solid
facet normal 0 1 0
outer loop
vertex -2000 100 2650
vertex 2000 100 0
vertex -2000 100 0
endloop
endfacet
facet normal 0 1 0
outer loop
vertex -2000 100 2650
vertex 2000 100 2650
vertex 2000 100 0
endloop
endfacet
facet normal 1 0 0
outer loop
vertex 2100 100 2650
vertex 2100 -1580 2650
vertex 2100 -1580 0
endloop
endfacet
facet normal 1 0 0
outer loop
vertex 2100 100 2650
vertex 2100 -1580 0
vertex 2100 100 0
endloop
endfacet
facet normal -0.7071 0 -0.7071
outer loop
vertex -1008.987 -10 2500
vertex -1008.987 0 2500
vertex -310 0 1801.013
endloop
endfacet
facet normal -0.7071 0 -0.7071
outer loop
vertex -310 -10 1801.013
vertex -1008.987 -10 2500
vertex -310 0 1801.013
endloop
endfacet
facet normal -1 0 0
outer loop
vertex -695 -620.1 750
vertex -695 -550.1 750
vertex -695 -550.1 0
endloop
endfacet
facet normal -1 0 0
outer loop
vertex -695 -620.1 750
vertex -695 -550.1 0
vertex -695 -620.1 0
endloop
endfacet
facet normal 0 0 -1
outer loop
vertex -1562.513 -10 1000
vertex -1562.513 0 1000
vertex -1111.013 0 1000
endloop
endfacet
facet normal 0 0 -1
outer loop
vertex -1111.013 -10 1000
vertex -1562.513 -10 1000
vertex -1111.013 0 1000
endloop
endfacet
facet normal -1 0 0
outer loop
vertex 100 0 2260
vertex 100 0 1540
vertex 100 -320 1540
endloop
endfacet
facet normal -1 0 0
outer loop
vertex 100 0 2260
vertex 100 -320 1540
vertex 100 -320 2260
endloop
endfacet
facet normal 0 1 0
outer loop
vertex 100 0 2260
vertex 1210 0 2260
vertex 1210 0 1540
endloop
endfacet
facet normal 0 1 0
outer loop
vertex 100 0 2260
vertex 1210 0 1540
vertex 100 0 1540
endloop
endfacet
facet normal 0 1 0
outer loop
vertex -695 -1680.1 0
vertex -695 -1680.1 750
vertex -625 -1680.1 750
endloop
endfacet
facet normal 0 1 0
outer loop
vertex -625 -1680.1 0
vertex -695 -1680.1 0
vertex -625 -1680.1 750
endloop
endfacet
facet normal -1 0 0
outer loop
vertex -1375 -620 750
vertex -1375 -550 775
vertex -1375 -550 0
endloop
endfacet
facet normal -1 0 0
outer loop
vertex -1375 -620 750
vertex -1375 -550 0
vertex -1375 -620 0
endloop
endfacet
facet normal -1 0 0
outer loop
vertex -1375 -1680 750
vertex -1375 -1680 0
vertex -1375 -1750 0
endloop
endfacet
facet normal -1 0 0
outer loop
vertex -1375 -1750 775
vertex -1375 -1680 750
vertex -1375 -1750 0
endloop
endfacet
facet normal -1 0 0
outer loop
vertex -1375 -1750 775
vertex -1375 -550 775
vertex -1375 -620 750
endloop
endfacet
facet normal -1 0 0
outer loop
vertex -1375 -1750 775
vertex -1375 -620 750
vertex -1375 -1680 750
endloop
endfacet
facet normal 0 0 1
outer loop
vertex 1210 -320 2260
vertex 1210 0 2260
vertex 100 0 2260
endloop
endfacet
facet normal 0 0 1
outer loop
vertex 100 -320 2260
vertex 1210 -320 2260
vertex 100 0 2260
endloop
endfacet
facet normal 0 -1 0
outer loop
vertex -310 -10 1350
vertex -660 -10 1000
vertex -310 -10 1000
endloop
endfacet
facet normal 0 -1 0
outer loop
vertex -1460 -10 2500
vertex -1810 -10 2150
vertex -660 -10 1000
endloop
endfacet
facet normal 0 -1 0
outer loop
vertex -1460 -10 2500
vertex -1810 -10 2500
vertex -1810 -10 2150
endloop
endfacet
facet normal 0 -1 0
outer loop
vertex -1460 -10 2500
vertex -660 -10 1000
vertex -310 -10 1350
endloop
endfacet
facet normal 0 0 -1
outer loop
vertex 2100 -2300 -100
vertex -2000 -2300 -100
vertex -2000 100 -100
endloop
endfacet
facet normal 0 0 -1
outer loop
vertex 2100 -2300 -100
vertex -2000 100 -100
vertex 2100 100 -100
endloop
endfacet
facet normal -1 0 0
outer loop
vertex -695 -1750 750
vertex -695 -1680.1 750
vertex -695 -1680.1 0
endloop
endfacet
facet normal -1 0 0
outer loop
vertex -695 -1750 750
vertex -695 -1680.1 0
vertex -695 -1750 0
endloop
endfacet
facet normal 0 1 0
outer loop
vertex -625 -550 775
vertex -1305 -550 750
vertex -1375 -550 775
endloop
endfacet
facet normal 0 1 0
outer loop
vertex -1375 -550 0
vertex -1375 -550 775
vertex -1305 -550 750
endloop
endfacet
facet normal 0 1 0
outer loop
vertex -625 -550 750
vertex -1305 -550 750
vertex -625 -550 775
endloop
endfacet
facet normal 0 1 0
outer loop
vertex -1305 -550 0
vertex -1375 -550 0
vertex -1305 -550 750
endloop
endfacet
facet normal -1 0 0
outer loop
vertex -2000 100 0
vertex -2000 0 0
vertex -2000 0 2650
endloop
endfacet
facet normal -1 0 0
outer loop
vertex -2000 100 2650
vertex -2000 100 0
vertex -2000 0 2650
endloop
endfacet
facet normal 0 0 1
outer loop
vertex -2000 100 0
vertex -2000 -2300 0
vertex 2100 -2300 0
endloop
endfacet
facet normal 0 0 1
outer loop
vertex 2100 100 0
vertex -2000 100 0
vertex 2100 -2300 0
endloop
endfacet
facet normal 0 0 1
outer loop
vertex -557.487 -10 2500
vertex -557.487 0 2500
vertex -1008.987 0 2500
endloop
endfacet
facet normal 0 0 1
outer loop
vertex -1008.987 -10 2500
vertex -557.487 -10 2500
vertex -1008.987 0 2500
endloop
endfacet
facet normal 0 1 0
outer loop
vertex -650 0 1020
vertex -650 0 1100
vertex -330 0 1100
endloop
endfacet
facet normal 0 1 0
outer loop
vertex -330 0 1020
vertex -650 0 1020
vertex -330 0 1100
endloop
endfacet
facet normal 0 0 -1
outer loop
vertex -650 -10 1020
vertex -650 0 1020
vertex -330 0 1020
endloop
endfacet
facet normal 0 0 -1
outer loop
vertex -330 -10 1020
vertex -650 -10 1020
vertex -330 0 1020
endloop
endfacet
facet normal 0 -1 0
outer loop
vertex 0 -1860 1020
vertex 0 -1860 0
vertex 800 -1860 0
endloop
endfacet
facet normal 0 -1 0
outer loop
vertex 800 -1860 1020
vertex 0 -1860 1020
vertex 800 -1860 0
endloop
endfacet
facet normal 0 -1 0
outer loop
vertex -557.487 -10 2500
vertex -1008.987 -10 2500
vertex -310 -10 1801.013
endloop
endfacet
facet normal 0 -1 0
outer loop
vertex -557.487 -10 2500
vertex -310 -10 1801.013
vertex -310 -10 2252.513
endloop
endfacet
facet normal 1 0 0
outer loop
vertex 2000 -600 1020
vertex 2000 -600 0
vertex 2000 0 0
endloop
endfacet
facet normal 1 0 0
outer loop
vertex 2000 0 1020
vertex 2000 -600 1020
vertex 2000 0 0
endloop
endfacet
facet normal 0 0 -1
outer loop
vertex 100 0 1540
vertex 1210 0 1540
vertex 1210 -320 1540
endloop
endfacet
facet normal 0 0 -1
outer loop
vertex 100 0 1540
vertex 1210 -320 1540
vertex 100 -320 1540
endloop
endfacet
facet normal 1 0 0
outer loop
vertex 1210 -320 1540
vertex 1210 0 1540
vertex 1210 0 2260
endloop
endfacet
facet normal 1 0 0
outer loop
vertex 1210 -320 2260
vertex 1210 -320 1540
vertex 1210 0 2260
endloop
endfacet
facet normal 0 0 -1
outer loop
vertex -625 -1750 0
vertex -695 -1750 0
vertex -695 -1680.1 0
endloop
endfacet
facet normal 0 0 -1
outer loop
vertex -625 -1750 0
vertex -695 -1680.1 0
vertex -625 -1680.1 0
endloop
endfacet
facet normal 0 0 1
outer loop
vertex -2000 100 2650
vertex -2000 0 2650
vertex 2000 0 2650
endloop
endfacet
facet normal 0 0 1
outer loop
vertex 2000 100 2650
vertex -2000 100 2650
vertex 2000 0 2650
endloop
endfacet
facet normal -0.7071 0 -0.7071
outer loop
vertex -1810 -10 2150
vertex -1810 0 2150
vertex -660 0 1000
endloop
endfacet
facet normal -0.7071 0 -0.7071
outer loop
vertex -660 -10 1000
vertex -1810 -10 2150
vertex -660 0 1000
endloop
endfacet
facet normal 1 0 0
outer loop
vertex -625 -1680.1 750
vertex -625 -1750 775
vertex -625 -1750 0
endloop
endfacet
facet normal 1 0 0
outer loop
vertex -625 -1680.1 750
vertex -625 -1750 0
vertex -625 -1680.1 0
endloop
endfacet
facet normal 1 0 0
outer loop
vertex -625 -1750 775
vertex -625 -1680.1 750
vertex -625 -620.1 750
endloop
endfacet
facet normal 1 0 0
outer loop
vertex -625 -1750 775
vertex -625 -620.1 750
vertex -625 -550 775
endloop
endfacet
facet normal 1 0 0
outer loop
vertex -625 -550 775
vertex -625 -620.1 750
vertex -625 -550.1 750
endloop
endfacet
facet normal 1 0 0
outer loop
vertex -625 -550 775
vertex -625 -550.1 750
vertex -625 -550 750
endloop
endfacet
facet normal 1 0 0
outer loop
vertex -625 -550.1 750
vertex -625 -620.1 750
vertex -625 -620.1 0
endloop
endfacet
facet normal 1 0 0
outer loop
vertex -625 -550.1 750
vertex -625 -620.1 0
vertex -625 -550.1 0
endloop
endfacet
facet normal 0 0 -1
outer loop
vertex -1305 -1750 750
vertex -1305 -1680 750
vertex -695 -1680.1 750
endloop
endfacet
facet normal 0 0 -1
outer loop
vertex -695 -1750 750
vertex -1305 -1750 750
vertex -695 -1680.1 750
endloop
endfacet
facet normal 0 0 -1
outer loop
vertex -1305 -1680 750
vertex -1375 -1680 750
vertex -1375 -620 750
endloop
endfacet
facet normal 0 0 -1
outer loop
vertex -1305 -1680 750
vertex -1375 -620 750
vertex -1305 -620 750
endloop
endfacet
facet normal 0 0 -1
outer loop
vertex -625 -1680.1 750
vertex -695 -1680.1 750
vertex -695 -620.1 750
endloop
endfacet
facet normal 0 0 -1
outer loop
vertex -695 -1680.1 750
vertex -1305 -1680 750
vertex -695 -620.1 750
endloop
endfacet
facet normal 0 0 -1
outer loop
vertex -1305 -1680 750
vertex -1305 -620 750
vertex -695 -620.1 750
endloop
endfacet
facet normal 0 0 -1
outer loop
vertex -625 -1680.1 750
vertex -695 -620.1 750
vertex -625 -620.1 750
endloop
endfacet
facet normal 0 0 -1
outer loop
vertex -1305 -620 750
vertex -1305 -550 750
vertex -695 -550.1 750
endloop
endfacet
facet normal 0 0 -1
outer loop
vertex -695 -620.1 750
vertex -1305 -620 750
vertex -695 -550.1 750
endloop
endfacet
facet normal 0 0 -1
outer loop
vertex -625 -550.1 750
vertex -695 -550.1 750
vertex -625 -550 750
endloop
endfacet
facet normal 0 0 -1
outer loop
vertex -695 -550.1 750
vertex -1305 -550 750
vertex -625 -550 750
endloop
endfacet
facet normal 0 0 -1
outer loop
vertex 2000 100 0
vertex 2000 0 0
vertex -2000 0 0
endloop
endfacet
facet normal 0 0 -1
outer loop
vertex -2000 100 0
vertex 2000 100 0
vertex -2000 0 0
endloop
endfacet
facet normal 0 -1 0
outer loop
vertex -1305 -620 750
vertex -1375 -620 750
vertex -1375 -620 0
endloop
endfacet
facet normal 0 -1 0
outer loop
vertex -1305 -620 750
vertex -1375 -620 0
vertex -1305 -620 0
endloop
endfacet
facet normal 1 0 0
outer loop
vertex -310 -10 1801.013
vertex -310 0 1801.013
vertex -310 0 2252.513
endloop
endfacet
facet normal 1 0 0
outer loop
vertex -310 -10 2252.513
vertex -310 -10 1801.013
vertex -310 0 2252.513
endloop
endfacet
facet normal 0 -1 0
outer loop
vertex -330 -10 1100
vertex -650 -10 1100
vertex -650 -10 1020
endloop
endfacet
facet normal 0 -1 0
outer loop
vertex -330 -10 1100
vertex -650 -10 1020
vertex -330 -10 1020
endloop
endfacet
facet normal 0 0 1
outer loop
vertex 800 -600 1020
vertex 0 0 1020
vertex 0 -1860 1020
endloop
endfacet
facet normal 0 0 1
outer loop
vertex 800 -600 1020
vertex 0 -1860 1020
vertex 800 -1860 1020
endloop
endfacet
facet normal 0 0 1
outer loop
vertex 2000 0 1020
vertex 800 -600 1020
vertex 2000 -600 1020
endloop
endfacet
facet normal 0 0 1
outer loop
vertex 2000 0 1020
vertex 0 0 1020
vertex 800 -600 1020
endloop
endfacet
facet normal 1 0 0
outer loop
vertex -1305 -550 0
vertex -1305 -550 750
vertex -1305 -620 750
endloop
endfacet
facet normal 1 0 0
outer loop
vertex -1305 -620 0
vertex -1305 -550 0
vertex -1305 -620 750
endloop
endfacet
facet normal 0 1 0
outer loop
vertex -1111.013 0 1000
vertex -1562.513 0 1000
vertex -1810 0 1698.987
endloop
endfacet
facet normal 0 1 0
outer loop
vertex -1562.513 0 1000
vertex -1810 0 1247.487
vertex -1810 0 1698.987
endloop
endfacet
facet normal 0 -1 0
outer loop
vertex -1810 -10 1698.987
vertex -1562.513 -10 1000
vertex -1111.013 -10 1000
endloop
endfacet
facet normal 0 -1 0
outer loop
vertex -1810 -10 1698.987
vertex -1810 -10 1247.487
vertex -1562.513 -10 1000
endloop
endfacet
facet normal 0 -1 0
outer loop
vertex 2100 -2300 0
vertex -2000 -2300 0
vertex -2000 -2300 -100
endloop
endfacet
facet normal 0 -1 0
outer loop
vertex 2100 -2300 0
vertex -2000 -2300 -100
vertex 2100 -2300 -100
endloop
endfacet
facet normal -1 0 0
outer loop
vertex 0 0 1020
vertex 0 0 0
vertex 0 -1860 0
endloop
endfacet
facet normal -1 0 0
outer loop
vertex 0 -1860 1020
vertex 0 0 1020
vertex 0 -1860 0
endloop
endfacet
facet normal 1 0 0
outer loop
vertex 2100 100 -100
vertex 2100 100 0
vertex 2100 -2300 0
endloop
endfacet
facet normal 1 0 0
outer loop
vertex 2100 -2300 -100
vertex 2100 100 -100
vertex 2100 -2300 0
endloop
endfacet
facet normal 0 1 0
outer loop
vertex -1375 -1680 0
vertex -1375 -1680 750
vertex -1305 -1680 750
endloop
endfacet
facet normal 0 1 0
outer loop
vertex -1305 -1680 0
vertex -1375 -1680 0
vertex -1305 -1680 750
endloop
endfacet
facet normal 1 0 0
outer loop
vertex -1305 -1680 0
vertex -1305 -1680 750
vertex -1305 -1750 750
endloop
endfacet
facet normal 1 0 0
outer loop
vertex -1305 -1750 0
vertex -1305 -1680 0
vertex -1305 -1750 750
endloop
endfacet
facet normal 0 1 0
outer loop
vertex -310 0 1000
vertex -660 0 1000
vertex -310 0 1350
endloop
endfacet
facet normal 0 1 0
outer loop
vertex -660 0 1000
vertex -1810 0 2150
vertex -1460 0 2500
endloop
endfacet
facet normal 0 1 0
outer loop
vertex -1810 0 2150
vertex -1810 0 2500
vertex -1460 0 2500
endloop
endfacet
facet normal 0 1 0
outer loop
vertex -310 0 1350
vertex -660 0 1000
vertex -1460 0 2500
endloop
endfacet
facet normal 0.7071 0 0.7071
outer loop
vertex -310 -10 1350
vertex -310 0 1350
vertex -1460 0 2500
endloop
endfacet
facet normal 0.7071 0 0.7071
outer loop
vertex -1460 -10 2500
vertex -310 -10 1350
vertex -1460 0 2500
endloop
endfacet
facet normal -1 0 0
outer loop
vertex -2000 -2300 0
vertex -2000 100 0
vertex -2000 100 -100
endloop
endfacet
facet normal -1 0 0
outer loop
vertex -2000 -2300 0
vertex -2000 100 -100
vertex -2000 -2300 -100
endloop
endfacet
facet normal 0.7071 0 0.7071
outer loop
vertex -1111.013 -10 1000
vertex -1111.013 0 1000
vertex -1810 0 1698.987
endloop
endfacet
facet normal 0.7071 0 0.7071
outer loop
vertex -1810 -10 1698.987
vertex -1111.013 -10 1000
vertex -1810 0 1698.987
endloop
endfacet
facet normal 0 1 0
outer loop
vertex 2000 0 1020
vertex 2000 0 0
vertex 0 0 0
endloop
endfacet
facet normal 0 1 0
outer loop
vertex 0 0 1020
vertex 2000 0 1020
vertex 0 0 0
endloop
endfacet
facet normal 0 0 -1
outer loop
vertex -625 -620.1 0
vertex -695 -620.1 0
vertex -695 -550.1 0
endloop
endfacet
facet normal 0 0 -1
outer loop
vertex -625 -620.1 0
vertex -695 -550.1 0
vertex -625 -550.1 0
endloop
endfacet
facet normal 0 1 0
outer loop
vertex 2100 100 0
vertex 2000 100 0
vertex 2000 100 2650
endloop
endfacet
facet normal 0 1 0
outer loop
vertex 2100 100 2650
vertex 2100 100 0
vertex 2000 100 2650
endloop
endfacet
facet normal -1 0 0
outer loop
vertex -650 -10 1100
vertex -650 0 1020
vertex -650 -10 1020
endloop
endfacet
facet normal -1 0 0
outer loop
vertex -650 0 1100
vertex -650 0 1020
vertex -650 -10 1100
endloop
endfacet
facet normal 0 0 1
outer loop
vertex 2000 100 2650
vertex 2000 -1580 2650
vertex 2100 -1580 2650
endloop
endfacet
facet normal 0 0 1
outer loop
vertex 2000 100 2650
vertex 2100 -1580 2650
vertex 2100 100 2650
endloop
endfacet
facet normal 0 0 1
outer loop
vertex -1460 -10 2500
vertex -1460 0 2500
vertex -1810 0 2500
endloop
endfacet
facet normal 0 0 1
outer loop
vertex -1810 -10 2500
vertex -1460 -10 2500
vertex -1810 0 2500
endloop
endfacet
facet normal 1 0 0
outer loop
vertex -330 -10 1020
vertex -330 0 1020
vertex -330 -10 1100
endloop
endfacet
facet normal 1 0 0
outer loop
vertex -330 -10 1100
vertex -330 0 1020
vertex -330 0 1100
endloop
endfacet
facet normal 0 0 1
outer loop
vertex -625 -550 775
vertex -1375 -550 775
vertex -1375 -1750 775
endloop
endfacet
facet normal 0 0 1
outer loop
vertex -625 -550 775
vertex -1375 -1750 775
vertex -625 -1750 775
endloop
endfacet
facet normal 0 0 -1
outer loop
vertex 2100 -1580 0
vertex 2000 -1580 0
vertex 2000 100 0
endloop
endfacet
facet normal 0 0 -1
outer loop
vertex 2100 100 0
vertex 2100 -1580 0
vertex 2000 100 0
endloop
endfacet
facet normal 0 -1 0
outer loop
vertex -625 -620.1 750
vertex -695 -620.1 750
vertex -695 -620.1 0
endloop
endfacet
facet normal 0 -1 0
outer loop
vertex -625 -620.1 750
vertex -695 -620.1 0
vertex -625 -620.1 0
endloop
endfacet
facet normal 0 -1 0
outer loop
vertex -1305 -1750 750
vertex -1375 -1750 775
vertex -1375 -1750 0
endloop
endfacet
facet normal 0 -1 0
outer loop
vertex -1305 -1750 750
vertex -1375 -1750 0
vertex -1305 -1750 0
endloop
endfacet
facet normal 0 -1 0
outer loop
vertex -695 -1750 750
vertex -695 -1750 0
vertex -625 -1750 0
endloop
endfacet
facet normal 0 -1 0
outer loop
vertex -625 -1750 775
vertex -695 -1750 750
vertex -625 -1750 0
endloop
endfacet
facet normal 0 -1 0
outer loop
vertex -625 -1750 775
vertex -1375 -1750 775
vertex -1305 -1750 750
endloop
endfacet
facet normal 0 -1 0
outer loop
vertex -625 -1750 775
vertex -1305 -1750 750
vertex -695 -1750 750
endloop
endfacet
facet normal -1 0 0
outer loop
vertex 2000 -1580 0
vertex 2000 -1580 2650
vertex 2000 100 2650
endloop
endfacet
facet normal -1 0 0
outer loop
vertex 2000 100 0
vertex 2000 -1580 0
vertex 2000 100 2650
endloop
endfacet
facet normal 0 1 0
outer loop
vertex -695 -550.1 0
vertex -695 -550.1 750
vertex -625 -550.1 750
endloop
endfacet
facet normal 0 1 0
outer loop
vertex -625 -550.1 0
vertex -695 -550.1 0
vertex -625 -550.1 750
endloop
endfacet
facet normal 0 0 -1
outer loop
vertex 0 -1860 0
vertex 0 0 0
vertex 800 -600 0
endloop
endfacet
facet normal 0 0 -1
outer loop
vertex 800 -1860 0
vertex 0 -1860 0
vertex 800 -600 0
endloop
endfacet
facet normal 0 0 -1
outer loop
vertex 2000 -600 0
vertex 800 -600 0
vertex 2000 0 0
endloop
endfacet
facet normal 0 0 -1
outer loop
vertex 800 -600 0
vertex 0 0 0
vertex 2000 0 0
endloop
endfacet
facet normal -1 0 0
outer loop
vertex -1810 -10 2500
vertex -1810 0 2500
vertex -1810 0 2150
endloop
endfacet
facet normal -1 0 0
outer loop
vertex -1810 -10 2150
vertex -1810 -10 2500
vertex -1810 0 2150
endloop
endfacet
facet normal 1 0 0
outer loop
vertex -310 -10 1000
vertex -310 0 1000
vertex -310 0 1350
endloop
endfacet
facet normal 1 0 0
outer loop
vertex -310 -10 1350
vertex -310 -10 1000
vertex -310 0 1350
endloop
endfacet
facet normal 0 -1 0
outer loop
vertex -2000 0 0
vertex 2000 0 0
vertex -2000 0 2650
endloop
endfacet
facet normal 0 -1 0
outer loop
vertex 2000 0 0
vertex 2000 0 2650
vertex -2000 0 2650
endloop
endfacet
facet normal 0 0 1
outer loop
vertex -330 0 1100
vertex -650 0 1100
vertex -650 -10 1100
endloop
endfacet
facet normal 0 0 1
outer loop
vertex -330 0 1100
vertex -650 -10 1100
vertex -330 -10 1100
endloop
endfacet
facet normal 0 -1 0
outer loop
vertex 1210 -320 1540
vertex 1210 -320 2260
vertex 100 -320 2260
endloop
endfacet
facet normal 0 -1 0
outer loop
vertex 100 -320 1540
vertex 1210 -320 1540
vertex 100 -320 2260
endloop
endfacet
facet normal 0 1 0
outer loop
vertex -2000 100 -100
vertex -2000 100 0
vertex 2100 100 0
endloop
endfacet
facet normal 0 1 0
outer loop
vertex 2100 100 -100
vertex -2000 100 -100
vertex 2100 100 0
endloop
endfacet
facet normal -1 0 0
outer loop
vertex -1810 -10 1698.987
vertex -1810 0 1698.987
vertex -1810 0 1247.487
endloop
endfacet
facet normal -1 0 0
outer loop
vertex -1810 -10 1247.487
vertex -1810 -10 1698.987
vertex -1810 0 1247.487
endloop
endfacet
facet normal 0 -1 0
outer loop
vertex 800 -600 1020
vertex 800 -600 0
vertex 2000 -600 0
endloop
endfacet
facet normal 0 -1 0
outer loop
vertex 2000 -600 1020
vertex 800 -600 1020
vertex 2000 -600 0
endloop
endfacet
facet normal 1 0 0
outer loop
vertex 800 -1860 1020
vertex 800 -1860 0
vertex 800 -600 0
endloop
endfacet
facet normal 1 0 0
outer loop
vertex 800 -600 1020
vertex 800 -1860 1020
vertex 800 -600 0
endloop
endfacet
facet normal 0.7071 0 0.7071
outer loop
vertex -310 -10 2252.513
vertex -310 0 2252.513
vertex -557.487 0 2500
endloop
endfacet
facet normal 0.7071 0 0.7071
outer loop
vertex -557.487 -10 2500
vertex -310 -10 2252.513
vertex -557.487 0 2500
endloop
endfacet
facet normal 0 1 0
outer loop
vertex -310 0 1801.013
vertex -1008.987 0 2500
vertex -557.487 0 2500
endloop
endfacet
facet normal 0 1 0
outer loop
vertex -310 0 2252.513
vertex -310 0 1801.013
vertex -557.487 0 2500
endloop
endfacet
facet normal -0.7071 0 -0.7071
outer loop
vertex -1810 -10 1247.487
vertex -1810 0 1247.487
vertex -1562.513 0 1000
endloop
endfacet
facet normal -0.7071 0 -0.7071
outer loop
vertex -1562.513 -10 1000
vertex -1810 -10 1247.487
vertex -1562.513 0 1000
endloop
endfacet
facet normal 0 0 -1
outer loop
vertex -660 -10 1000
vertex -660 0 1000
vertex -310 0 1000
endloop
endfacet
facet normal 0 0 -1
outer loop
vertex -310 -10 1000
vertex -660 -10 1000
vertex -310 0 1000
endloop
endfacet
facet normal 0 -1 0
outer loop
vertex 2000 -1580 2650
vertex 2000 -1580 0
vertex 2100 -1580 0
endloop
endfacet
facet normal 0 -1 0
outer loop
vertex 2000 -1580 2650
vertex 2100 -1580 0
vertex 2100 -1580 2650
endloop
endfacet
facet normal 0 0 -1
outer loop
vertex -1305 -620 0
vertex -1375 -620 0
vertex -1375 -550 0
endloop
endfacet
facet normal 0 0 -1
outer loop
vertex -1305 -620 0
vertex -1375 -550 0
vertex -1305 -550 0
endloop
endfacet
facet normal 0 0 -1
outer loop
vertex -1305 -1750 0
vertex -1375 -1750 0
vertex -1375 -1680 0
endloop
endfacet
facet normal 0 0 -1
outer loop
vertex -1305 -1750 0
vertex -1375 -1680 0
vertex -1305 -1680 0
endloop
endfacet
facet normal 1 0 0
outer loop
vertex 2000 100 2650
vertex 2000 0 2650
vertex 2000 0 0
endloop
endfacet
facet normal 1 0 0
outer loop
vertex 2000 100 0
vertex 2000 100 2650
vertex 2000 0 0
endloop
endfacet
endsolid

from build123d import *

# Parameters (mm, degrees)
F1_DEPTH  = 1020
F3_W      = 1110
F3_H      = 720
F4_DEPTH  = 100
F5_DEPTH  = 320
F7_W      = 1680
F7_H      = 2650
F8_DEPTH  = 100
F10_W     = 4100
F10_H     = 2400
F11_DEPTH = 100
F12_W     = 750
F12_H     = 1200
F13_DEPTH = 25
F15_W     = 70
F15_H     = 70
F15_H_2   = 69.9
F16_DEPTH = 750
F18_W     = 320
F18_H     = 80
F19_DEPTH = 10
F21_DEPTH = 10


with BuildPart() as f1:
    # F0 (on Top) → F1 (new body)
    with BuildSketch(Plane.XY):
        Polygon((800, 0), (0, 0), (0, -1860), (800, -1860), (800, -600), (2000, -600), (2000, 0), align=None)
    extrude(amount=F1_DEPTH)


with BuildPart() as f4:
    # F3 (on offset) → F4 (new body)
    with BuildSketch(Plane(origin=(0, 0, 0), x_dir=(-1, 0, 0), z_dir=(0, 1, 0))):
        Polygon((-2000, 0), (0, 0), (2000, 0), (2000, 2650), (0, 2650), (-2000, 2650), align=None)
        with Locations((-655, 1900)):
            Rectangle(F3_W, F3_H, mode=Mode.SUBTRACT)
        with Locations((-655, 1900)):
            Rectangle(F3_W, F3_H)
    extrude(amount=F4_DEPTH)


with BuildPart() as f5:
    # F3 (on offset) → F5 (new body)
    with BuildSketch(Plane(origin=(0, 0, 0), x_dir=(-1, 0, 0), z_dir=(0, 1, 0))):
        with Locations((-655, 1900)):
            Rectangle(F3_W, F3_H)
    extrude(amount=-F5_DEPTH)


with BuildPart() as f8:
    # F7 (on offset) → F8 (new body)
    with BuildSketch(Plane.YZ.offset(2000)):
        with Locations((-740, 1325)):
            Rectangle(F7_W, F7_H)
    extrude(amount=F8_DEPTH)


with BuildPart() as f11:
    # F10 (on offset) → F11 (new body)
    with BuildSketch(Plane(origin=(0, 0, 0), x_dir=(1, 0, 0), z_dir=(0, 0, -1))):
        with Locations((50, 1100)):
            Rectangle(F10_W, F10_H)
    extrude(amount=F11_DEPTH)


with BuildPart() as f13:
    # F12 (on face) → F13 (new body)
    with BuildSketch(Plane.XY):
        with Locations((-1000, -1150)):
            Rectangle(F12_W, F12_H)
    extrude(amount=F13_DEPTH)


with BuildPart() as f13_1:
    # F14: moved
    add(f13.part.moved(Location((0, 0, 750))))

    # F15 (on face) → F16 (join)
    with BuildSketch(Plane(origin=(0, 0, 750), x_dir=(1, 0, 0), z_dir=(0, 0, -1))):
        with Locations((-1340, 1715)):
            Rectangle(F15_W, F15_H)
        with Locations((-660, 1715.05)):
            Rectangle(F15_W, F15_H_2)
        with Locations((-660, 585.1)):
            Rectangle(F15_W, F15_H)
        with Locations((-1340, 585)):
            Rectangle(F15_W, F15_H)
    extrude(amount=F16_DEPTH)


with BuildPart() as f19:
    # F18 (on offset) → F19 (new body)
    with BuildSketch(Plane.XZ):
        with Locations((-490, 1060)):
            Rectangle(F18_W, F18_H)
    extrude(amount=F19_DEPTH)


with BuildPart() as f21:
    # F20 (on offset) → F21 (new body)
    with BuildSketch(Plane.XZ):
        Polygon((-1810, 2150), (-660, 1000), (-310, 1000), (-310, 1350), (-1460, 2500), (-1810, 2500), align=None)
    extrude(amount=F21_DEPTH)


with BuildPart() as f21b:
    # F20 (on offset) → F21, piece 2 (new body)
    with BuildSketch(Plane.XZ):
        Polygon((-310, 2252.5126265847), (-557.4873734153, 2500), (-1008.9873734153, 2500), (-310, 1801.0126265847), align=None)
    extrude(amount=F21_DEPTH)


with BuildPart() as f21c:
    # F20 (on offset) → F21, piece 3 (new body)
    with BuildSketch(Plane.XZ):
        Polygon((-1562.5126265847, 1000), (-1111.0126265847, 1000), (-1810, 1698.9873734153), (-1810, 1247.4873734153), align=None)
    extrude(amount=F21_DEPTH)


solid = Compound([f1.part, f4.part, f5.part, f8.part, f11.part, f13_1.part, f19.part, f21.part, f21b.part, f21c.part])
